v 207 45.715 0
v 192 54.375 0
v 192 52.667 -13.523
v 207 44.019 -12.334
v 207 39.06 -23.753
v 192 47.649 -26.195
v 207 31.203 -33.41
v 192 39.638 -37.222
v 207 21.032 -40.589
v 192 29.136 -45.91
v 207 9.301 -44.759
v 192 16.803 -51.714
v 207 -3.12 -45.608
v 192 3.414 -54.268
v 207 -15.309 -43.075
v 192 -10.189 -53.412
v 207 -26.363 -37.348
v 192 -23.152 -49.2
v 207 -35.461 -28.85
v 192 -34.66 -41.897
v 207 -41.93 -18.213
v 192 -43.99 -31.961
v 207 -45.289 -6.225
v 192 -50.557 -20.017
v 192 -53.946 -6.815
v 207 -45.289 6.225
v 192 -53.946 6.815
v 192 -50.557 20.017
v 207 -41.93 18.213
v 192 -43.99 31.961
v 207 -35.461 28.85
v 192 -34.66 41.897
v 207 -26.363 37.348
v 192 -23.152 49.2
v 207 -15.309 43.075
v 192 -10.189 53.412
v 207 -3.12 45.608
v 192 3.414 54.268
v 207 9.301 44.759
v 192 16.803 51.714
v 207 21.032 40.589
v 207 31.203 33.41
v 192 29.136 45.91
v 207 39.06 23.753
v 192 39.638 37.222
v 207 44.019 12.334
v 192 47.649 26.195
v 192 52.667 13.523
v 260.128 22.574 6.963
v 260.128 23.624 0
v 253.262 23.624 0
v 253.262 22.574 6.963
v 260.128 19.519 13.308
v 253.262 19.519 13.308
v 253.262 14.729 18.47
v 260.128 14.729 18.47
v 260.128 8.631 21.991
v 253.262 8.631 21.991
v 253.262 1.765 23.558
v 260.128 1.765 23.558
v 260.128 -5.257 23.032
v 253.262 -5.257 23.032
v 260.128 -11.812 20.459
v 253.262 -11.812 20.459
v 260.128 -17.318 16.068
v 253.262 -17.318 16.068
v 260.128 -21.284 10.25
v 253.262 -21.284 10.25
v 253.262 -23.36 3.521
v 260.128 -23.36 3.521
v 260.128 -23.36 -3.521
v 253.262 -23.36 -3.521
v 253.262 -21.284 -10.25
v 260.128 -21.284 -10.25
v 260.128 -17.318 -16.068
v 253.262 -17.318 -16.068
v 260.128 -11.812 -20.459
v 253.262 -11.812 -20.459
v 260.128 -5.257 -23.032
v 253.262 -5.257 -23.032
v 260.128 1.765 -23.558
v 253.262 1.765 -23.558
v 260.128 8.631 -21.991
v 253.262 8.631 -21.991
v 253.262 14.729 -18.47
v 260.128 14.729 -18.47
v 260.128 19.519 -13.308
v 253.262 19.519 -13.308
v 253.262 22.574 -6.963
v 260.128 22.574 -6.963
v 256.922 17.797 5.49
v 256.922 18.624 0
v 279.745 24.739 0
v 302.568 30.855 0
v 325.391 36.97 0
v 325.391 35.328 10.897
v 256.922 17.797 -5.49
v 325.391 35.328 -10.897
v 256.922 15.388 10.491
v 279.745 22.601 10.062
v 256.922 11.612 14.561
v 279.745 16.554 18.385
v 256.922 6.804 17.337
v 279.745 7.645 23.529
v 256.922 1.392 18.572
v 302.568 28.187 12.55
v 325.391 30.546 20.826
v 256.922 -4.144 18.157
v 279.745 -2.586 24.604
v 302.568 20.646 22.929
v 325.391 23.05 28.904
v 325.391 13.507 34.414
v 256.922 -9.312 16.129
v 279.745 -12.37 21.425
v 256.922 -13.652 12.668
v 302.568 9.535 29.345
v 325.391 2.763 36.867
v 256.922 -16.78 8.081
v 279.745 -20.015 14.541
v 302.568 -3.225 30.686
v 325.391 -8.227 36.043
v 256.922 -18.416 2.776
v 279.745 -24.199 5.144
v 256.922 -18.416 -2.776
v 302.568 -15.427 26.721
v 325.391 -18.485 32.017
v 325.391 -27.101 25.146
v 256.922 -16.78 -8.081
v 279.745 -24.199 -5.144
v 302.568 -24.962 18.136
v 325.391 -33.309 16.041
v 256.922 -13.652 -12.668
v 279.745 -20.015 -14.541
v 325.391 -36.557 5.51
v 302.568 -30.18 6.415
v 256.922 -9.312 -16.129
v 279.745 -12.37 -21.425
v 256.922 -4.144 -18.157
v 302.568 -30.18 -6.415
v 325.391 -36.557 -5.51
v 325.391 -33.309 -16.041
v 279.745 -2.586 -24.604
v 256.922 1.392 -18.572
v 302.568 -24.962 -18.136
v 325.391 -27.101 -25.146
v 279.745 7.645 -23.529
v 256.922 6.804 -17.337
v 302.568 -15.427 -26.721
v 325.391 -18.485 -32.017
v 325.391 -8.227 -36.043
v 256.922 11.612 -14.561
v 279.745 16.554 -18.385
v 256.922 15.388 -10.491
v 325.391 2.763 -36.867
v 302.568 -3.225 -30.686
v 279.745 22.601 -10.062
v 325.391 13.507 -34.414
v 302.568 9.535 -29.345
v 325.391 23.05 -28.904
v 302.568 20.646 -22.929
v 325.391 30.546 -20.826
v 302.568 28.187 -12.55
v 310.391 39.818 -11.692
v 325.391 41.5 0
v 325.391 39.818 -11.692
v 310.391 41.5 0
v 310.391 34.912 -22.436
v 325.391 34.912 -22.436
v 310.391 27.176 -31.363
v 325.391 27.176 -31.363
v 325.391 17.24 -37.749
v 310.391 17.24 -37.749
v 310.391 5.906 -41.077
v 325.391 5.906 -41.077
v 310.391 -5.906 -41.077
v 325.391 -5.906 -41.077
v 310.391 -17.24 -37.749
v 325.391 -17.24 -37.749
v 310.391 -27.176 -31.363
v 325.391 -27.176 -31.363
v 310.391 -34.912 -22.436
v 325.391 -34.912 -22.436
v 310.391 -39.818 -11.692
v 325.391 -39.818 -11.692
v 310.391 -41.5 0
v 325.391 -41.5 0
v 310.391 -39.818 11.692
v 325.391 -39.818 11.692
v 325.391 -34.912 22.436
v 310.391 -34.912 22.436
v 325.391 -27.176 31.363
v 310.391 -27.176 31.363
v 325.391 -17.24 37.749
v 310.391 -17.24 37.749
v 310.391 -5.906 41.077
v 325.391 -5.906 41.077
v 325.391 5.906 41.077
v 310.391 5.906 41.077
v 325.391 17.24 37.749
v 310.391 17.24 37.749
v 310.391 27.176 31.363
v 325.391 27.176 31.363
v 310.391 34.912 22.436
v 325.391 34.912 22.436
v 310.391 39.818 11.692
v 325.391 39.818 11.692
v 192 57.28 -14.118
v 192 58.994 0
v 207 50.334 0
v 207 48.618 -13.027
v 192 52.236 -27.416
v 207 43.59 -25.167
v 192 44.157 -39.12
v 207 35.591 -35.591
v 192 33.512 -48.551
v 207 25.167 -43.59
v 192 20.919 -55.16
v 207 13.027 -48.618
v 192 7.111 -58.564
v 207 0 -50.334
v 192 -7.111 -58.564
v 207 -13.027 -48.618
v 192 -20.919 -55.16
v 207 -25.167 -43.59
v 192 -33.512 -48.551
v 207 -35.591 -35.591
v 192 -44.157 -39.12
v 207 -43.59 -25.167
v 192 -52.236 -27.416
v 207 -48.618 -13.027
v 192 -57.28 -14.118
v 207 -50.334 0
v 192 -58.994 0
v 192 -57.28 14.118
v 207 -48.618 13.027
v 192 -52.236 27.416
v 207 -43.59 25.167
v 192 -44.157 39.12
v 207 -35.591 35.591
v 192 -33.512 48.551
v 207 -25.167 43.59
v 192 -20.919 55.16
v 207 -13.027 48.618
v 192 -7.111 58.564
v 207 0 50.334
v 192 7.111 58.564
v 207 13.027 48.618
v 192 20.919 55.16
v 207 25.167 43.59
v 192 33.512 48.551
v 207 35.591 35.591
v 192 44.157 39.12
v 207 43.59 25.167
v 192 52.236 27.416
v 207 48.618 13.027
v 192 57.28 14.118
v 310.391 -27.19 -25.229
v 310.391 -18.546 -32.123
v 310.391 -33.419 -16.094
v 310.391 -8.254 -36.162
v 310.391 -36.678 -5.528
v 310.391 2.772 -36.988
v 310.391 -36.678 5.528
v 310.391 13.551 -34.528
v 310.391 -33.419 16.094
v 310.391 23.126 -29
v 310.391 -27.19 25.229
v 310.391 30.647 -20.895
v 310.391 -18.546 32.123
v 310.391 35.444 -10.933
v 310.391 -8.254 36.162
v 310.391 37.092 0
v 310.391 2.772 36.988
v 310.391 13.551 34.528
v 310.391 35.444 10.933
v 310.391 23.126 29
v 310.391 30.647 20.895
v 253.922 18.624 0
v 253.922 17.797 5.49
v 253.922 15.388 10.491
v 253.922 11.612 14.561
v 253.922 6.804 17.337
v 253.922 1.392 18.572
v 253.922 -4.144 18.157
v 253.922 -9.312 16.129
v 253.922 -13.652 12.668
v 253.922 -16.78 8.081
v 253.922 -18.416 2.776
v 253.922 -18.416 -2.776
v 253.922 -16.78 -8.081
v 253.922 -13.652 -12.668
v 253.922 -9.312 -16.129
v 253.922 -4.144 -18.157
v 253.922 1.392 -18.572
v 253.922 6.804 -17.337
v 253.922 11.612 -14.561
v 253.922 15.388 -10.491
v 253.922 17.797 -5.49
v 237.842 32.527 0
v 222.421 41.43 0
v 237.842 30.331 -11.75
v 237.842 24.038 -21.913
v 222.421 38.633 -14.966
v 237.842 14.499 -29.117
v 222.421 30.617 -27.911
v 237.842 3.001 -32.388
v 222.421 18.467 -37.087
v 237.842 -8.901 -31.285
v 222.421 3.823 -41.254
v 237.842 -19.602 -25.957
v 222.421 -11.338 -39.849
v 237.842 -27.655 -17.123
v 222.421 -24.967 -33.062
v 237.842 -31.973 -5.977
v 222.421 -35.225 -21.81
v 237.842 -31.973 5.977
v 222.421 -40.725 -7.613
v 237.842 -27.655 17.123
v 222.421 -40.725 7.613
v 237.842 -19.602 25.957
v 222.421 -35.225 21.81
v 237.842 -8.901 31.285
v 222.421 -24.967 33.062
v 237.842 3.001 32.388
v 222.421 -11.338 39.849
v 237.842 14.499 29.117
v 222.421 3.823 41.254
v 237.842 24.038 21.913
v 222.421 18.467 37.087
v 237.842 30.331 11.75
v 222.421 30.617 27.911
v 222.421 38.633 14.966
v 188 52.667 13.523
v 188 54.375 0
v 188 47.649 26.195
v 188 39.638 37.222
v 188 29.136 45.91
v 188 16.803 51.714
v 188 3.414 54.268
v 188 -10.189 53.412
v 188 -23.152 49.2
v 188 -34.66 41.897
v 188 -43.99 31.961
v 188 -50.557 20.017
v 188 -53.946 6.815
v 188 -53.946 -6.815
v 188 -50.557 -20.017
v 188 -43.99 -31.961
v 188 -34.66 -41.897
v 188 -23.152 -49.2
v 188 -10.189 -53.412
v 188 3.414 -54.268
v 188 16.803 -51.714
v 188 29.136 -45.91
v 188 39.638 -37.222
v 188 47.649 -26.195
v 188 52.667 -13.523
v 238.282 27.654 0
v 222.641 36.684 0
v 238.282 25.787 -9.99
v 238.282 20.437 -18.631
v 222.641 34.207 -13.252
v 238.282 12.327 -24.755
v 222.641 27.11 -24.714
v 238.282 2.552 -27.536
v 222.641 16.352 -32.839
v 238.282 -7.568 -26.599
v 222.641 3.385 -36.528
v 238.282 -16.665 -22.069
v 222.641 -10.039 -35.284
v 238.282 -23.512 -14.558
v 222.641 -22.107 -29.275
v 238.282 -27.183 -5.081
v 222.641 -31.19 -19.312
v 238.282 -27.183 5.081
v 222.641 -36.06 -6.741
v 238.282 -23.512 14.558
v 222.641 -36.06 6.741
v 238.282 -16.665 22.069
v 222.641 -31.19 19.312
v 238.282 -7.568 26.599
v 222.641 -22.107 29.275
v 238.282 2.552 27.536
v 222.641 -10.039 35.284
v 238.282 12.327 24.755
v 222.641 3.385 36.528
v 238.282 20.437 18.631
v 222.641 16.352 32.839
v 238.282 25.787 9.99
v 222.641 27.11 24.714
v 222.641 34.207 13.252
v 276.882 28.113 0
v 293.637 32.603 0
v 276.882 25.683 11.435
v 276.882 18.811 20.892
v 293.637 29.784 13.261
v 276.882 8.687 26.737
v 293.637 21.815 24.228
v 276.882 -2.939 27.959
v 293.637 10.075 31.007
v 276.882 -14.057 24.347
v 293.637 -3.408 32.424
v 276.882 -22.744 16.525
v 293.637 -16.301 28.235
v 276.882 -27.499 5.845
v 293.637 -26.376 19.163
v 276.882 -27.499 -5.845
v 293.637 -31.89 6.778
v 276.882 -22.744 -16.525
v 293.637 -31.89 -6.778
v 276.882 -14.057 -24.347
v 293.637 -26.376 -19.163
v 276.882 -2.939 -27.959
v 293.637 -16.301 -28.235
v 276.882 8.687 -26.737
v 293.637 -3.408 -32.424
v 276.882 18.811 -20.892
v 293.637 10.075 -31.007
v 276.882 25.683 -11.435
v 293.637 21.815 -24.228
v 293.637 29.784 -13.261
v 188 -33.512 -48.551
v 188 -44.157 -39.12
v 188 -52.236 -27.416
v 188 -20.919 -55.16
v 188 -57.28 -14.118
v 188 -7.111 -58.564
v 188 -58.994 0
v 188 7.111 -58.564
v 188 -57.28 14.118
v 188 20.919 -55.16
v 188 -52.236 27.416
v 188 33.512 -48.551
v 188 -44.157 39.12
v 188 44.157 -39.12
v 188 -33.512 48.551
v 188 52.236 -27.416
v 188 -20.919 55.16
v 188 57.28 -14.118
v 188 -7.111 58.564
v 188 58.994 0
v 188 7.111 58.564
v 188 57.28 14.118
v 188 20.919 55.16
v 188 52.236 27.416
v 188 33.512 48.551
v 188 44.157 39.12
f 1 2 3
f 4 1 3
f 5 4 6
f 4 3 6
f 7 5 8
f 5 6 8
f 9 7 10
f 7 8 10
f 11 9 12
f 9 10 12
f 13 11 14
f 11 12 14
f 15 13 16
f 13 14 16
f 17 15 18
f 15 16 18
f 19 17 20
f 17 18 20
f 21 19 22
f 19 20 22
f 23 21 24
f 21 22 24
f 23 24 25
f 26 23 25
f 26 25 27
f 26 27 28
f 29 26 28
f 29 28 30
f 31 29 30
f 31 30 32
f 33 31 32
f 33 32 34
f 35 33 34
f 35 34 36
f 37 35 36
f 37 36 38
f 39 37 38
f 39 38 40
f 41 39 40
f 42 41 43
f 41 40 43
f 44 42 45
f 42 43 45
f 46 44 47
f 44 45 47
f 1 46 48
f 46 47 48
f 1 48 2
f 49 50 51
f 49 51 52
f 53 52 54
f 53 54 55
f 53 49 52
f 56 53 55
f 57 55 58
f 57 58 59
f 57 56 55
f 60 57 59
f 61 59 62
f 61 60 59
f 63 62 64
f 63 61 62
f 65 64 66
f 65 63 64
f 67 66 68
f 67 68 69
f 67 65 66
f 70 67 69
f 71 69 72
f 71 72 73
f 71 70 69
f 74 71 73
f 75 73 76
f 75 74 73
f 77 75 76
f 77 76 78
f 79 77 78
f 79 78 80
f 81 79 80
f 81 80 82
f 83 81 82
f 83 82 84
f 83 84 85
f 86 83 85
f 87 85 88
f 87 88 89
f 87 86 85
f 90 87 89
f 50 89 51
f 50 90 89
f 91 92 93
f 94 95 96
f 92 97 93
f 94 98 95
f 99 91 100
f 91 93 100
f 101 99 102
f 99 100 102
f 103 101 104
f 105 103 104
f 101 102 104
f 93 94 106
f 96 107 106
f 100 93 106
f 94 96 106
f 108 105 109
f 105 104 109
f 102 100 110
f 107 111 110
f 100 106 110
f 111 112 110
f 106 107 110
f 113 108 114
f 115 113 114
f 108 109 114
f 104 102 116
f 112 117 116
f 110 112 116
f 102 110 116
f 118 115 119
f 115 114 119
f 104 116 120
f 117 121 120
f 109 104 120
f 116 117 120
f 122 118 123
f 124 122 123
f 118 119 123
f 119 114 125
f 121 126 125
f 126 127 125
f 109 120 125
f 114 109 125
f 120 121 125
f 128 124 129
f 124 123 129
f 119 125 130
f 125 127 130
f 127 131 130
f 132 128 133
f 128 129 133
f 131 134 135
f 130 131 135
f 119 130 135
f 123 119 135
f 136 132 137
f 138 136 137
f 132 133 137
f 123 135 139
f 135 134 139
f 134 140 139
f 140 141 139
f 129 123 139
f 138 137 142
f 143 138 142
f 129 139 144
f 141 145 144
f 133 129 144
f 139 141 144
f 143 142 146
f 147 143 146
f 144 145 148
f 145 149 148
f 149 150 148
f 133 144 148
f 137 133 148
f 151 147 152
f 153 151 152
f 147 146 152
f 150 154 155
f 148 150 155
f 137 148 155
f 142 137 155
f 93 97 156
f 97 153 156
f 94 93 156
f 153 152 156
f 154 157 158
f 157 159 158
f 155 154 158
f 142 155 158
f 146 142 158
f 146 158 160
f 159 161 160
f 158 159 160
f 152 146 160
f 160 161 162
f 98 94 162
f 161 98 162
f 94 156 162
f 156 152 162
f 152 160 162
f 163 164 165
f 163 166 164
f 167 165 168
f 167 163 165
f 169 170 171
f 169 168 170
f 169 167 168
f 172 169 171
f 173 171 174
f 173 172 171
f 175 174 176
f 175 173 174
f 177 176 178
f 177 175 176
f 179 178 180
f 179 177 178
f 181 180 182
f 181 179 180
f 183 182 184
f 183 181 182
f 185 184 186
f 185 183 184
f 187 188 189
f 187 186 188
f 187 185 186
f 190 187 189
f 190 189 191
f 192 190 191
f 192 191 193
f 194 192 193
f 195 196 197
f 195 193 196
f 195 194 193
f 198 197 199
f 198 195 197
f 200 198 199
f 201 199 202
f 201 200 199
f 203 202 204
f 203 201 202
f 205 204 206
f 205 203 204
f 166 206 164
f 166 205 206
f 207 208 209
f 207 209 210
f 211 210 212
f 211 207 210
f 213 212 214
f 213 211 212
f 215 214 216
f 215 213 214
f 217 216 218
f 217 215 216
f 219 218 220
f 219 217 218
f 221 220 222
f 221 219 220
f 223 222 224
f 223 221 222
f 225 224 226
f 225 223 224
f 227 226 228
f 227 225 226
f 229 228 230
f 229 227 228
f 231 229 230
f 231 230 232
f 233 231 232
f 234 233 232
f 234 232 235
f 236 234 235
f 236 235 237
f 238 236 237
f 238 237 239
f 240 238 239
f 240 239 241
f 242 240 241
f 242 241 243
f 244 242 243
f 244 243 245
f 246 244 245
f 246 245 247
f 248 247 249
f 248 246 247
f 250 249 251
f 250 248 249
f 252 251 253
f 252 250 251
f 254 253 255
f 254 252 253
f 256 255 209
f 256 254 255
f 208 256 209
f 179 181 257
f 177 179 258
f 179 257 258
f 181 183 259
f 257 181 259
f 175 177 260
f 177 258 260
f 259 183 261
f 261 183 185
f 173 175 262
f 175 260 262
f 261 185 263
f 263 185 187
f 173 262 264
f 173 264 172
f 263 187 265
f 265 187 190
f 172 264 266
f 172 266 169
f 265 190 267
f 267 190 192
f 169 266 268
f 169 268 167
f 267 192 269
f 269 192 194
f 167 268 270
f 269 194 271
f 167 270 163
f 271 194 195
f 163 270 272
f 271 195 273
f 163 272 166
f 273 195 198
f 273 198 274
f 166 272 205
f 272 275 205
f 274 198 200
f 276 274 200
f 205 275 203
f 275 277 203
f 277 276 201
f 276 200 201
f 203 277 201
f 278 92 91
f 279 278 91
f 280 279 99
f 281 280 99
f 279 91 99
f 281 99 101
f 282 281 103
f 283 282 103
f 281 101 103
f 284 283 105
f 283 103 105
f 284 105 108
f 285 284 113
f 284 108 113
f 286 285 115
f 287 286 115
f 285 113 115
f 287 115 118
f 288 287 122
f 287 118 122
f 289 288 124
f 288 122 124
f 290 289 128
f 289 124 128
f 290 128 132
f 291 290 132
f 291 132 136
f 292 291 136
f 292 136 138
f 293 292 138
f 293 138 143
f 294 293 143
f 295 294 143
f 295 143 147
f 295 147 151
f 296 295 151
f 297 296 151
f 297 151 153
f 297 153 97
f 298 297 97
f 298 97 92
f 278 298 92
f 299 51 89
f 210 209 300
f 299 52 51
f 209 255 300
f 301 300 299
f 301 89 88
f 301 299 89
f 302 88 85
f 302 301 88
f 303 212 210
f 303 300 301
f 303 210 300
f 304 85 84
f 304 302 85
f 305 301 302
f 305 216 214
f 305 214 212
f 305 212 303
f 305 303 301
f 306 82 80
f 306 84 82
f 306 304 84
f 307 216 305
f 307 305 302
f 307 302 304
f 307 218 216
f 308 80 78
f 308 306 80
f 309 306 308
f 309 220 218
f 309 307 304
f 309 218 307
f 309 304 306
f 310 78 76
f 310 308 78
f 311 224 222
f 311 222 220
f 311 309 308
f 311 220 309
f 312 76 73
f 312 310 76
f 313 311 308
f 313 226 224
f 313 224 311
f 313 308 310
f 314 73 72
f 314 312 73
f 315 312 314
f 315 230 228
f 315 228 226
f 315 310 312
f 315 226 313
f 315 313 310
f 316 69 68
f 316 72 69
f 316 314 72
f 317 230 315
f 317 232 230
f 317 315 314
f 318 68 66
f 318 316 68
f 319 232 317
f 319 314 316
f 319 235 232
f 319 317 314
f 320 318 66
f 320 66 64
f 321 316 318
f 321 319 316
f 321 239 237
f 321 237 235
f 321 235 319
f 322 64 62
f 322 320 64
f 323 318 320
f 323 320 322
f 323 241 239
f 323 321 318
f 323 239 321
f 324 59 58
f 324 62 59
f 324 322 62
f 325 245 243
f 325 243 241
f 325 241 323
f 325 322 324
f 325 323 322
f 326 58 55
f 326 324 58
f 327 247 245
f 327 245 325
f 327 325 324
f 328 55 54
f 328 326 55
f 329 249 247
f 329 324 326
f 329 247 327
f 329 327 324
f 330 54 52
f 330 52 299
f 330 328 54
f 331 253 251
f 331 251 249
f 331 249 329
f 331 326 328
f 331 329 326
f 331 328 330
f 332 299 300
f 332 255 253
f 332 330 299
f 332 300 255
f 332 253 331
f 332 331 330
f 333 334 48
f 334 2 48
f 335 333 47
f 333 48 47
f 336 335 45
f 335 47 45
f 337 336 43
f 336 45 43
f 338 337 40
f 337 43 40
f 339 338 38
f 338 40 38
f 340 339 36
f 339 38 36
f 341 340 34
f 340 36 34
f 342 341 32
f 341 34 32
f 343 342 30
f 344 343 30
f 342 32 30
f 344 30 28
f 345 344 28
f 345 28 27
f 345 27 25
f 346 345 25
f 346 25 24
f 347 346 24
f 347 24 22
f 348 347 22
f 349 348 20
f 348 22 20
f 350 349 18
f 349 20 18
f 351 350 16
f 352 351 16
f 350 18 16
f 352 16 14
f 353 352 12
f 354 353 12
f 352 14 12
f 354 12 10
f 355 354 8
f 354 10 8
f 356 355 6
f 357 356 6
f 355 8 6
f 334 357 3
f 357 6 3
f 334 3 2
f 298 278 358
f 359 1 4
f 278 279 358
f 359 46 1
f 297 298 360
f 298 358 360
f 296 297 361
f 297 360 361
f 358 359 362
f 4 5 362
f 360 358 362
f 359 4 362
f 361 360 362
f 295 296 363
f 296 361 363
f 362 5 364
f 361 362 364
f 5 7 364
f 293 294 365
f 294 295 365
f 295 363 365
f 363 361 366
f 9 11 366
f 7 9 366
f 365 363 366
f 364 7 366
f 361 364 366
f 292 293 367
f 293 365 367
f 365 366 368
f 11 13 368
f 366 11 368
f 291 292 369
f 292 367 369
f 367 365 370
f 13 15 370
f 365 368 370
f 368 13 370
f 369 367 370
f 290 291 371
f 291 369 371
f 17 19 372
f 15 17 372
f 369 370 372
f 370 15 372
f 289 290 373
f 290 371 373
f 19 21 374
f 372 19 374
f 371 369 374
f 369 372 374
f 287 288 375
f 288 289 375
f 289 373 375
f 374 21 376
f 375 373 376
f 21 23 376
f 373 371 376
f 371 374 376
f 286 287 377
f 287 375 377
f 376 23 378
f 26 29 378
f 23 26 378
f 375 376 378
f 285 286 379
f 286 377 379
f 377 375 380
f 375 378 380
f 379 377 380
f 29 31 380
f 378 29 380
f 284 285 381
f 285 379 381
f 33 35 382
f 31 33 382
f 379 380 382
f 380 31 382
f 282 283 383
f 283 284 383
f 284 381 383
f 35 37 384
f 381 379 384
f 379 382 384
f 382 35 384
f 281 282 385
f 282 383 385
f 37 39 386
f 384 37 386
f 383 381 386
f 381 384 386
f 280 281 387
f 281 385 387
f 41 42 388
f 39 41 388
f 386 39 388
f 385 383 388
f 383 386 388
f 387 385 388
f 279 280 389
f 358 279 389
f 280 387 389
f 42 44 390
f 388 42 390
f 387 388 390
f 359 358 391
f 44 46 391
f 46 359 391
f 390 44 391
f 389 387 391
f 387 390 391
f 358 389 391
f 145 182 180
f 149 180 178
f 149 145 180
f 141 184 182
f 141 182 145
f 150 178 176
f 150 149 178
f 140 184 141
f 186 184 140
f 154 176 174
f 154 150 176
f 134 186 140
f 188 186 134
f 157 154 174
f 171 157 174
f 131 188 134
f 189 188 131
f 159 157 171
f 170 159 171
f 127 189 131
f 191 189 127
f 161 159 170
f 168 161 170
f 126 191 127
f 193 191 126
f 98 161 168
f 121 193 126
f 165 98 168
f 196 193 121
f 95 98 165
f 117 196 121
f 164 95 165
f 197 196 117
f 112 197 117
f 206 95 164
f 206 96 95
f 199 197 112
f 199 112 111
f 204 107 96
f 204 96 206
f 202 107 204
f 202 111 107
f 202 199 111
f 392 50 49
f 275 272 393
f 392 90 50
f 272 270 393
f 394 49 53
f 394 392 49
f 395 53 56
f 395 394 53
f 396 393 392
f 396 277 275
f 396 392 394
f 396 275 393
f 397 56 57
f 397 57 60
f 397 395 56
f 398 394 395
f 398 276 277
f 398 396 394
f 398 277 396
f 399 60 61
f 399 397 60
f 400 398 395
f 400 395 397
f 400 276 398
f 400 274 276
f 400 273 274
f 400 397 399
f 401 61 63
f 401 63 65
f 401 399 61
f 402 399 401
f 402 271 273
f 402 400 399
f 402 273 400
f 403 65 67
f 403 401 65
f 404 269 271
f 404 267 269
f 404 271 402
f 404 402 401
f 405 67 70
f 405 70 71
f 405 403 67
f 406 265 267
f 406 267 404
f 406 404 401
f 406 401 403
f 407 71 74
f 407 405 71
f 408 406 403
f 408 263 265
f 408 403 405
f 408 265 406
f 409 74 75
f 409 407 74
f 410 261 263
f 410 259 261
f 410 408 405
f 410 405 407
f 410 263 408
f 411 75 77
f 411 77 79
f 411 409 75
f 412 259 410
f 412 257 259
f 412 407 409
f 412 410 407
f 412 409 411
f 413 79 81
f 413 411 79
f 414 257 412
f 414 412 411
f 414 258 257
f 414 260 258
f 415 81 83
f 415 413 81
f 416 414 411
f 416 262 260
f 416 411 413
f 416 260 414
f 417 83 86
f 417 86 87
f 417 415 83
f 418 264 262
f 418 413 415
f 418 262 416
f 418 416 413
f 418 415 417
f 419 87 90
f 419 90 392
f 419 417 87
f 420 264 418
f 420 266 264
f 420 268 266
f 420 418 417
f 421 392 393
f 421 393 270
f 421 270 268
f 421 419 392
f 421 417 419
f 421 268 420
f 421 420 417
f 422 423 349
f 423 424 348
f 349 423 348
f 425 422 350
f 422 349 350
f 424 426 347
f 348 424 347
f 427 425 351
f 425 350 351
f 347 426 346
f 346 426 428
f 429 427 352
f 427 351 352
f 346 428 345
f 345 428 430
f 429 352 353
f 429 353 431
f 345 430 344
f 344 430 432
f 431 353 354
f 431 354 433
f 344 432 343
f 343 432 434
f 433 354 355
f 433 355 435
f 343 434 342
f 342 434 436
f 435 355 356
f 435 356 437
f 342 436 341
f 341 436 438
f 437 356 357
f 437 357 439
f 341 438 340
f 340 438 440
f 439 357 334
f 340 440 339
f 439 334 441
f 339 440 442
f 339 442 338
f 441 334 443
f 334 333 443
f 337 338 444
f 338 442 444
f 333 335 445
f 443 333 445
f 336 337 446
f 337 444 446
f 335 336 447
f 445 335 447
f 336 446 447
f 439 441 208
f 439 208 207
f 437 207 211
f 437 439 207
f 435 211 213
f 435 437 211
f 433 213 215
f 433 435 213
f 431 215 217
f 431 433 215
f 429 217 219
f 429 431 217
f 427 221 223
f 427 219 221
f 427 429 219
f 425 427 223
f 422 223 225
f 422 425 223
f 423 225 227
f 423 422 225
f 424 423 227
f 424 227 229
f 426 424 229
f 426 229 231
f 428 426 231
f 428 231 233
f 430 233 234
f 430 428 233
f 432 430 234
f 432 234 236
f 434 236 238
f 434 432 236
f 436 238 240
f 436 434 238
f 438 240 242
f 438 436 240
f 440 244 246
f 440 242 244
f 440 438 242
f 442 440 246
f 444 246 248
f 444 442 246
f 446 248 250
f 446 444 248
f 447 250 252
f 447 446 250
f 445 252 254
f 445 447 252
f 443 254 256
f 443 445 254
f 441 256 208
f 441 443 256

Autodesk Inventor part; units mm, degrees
ref_plane "YZ Plane" through (0, 0, 0) normal (1, 0, 0) x (0, 1, 0)
ref_plane "XZ Plane" through (0, 0, 0) normal (0, 1, 0) x (-1, 0, 0)
ref_plane "XY Plane" through (0, 0, 0) normal (0, 0, 1) x (1, 0, 0)
sketch "Sketch1" plane through (0, 0, 0) normal (0, 0, 1) x (1, 0, 0)
  line L0 (0, 0) -> (0, 54.375)
  line L1 (0, 54.375) -> (20, 54.375)
  line L2 (0, 0) -> (772.3927, 0)
  line L3 (253.9225, 18.624) -> (253.9225, 0) construction
  line L4 (192, 54.375) -> (253.9225, 18.624)
  line L5 (253.9225, 18.624) -> (256.9225, 18.624)
  line L6 (256.9225, 18.624) -> (325.3908, 36.97)
  line L7 (325.3908, 36.97) -> (325.3908, 0)
  line L8 (192, 54.375) -> (192, 0)
  line L9 (0, 54.375) -> (0, 74.375)
  line L10 (0, 74.375) -> (20, 74.375)
  line L11 (20, 74.375) -> (20, 58.375)
  line L12 (20, 58.375) -> (172, 58.375)
  line L13 (192, 54.375) -> (192, 74.375) construction
  line L14 (325.3908, 36.4995) -> (325.3908, 41.4995)
  line L15 (207, 50.3335) -> (253.2623, 23.624)
  line L16 (260.128, 23.624) -> (310.3908, 37.0919)
  line L17 (253.2623, 23.624) -> (260.128, 23.624)
  line L18 (310.3908, 41.4995) -> (310.3908, 37.0919)
  line L19 (207, 45.7147) -> (207, 21.1203)
  line L20 (325.3908, 36.4995) -> (325.3908, 41.4995)
  line L21 (325.3908, 41.4995) -> (310.3908, 41.4995)
  line L22 (207, 50.3335) -> (192, 58.9938)
  line L23 (207, 50.3335) -> (266.427, 50.3335) construction
  line L24 (172, 58.375) -> (185.0718, 58.375)
  line L25 (192, 58.9938) -> (188, 58.9938)
  line L26 (188, 58.9938) -> (188, 54.375)
  line L27 (188, 54.375) -> (192, 54.375)
  point P0 (255.4225, 18.624)
  dimension "d0" = 54.375
  dimension "d2" = 18.624
  dimension "d3" = 150
  dimension "d4" = 3
  dimension "d5" = 15
  dimension "d6" = 36.97
  dimension "d7" = 518.4701
  dimension "d8" = 20
  dimension "d9" = 20
  dimension "d10" = 16
  dimension "d18" = 4
  dimension "d21" = 5
  dimension "d22" = 15
  dimension "d23" = 150
  dimension "d24" = 4
revolve "Revolution1" add sketch "Sketch1" angle 360 about axis through (0, 0, 0) along (1, 0, 0) contours L27 L26 L25 L22 L15 L17 L16 L18 L21 L14 L6 L5 L4
properties part number "nozzle" material "Stainless Steel, Austenitic"
